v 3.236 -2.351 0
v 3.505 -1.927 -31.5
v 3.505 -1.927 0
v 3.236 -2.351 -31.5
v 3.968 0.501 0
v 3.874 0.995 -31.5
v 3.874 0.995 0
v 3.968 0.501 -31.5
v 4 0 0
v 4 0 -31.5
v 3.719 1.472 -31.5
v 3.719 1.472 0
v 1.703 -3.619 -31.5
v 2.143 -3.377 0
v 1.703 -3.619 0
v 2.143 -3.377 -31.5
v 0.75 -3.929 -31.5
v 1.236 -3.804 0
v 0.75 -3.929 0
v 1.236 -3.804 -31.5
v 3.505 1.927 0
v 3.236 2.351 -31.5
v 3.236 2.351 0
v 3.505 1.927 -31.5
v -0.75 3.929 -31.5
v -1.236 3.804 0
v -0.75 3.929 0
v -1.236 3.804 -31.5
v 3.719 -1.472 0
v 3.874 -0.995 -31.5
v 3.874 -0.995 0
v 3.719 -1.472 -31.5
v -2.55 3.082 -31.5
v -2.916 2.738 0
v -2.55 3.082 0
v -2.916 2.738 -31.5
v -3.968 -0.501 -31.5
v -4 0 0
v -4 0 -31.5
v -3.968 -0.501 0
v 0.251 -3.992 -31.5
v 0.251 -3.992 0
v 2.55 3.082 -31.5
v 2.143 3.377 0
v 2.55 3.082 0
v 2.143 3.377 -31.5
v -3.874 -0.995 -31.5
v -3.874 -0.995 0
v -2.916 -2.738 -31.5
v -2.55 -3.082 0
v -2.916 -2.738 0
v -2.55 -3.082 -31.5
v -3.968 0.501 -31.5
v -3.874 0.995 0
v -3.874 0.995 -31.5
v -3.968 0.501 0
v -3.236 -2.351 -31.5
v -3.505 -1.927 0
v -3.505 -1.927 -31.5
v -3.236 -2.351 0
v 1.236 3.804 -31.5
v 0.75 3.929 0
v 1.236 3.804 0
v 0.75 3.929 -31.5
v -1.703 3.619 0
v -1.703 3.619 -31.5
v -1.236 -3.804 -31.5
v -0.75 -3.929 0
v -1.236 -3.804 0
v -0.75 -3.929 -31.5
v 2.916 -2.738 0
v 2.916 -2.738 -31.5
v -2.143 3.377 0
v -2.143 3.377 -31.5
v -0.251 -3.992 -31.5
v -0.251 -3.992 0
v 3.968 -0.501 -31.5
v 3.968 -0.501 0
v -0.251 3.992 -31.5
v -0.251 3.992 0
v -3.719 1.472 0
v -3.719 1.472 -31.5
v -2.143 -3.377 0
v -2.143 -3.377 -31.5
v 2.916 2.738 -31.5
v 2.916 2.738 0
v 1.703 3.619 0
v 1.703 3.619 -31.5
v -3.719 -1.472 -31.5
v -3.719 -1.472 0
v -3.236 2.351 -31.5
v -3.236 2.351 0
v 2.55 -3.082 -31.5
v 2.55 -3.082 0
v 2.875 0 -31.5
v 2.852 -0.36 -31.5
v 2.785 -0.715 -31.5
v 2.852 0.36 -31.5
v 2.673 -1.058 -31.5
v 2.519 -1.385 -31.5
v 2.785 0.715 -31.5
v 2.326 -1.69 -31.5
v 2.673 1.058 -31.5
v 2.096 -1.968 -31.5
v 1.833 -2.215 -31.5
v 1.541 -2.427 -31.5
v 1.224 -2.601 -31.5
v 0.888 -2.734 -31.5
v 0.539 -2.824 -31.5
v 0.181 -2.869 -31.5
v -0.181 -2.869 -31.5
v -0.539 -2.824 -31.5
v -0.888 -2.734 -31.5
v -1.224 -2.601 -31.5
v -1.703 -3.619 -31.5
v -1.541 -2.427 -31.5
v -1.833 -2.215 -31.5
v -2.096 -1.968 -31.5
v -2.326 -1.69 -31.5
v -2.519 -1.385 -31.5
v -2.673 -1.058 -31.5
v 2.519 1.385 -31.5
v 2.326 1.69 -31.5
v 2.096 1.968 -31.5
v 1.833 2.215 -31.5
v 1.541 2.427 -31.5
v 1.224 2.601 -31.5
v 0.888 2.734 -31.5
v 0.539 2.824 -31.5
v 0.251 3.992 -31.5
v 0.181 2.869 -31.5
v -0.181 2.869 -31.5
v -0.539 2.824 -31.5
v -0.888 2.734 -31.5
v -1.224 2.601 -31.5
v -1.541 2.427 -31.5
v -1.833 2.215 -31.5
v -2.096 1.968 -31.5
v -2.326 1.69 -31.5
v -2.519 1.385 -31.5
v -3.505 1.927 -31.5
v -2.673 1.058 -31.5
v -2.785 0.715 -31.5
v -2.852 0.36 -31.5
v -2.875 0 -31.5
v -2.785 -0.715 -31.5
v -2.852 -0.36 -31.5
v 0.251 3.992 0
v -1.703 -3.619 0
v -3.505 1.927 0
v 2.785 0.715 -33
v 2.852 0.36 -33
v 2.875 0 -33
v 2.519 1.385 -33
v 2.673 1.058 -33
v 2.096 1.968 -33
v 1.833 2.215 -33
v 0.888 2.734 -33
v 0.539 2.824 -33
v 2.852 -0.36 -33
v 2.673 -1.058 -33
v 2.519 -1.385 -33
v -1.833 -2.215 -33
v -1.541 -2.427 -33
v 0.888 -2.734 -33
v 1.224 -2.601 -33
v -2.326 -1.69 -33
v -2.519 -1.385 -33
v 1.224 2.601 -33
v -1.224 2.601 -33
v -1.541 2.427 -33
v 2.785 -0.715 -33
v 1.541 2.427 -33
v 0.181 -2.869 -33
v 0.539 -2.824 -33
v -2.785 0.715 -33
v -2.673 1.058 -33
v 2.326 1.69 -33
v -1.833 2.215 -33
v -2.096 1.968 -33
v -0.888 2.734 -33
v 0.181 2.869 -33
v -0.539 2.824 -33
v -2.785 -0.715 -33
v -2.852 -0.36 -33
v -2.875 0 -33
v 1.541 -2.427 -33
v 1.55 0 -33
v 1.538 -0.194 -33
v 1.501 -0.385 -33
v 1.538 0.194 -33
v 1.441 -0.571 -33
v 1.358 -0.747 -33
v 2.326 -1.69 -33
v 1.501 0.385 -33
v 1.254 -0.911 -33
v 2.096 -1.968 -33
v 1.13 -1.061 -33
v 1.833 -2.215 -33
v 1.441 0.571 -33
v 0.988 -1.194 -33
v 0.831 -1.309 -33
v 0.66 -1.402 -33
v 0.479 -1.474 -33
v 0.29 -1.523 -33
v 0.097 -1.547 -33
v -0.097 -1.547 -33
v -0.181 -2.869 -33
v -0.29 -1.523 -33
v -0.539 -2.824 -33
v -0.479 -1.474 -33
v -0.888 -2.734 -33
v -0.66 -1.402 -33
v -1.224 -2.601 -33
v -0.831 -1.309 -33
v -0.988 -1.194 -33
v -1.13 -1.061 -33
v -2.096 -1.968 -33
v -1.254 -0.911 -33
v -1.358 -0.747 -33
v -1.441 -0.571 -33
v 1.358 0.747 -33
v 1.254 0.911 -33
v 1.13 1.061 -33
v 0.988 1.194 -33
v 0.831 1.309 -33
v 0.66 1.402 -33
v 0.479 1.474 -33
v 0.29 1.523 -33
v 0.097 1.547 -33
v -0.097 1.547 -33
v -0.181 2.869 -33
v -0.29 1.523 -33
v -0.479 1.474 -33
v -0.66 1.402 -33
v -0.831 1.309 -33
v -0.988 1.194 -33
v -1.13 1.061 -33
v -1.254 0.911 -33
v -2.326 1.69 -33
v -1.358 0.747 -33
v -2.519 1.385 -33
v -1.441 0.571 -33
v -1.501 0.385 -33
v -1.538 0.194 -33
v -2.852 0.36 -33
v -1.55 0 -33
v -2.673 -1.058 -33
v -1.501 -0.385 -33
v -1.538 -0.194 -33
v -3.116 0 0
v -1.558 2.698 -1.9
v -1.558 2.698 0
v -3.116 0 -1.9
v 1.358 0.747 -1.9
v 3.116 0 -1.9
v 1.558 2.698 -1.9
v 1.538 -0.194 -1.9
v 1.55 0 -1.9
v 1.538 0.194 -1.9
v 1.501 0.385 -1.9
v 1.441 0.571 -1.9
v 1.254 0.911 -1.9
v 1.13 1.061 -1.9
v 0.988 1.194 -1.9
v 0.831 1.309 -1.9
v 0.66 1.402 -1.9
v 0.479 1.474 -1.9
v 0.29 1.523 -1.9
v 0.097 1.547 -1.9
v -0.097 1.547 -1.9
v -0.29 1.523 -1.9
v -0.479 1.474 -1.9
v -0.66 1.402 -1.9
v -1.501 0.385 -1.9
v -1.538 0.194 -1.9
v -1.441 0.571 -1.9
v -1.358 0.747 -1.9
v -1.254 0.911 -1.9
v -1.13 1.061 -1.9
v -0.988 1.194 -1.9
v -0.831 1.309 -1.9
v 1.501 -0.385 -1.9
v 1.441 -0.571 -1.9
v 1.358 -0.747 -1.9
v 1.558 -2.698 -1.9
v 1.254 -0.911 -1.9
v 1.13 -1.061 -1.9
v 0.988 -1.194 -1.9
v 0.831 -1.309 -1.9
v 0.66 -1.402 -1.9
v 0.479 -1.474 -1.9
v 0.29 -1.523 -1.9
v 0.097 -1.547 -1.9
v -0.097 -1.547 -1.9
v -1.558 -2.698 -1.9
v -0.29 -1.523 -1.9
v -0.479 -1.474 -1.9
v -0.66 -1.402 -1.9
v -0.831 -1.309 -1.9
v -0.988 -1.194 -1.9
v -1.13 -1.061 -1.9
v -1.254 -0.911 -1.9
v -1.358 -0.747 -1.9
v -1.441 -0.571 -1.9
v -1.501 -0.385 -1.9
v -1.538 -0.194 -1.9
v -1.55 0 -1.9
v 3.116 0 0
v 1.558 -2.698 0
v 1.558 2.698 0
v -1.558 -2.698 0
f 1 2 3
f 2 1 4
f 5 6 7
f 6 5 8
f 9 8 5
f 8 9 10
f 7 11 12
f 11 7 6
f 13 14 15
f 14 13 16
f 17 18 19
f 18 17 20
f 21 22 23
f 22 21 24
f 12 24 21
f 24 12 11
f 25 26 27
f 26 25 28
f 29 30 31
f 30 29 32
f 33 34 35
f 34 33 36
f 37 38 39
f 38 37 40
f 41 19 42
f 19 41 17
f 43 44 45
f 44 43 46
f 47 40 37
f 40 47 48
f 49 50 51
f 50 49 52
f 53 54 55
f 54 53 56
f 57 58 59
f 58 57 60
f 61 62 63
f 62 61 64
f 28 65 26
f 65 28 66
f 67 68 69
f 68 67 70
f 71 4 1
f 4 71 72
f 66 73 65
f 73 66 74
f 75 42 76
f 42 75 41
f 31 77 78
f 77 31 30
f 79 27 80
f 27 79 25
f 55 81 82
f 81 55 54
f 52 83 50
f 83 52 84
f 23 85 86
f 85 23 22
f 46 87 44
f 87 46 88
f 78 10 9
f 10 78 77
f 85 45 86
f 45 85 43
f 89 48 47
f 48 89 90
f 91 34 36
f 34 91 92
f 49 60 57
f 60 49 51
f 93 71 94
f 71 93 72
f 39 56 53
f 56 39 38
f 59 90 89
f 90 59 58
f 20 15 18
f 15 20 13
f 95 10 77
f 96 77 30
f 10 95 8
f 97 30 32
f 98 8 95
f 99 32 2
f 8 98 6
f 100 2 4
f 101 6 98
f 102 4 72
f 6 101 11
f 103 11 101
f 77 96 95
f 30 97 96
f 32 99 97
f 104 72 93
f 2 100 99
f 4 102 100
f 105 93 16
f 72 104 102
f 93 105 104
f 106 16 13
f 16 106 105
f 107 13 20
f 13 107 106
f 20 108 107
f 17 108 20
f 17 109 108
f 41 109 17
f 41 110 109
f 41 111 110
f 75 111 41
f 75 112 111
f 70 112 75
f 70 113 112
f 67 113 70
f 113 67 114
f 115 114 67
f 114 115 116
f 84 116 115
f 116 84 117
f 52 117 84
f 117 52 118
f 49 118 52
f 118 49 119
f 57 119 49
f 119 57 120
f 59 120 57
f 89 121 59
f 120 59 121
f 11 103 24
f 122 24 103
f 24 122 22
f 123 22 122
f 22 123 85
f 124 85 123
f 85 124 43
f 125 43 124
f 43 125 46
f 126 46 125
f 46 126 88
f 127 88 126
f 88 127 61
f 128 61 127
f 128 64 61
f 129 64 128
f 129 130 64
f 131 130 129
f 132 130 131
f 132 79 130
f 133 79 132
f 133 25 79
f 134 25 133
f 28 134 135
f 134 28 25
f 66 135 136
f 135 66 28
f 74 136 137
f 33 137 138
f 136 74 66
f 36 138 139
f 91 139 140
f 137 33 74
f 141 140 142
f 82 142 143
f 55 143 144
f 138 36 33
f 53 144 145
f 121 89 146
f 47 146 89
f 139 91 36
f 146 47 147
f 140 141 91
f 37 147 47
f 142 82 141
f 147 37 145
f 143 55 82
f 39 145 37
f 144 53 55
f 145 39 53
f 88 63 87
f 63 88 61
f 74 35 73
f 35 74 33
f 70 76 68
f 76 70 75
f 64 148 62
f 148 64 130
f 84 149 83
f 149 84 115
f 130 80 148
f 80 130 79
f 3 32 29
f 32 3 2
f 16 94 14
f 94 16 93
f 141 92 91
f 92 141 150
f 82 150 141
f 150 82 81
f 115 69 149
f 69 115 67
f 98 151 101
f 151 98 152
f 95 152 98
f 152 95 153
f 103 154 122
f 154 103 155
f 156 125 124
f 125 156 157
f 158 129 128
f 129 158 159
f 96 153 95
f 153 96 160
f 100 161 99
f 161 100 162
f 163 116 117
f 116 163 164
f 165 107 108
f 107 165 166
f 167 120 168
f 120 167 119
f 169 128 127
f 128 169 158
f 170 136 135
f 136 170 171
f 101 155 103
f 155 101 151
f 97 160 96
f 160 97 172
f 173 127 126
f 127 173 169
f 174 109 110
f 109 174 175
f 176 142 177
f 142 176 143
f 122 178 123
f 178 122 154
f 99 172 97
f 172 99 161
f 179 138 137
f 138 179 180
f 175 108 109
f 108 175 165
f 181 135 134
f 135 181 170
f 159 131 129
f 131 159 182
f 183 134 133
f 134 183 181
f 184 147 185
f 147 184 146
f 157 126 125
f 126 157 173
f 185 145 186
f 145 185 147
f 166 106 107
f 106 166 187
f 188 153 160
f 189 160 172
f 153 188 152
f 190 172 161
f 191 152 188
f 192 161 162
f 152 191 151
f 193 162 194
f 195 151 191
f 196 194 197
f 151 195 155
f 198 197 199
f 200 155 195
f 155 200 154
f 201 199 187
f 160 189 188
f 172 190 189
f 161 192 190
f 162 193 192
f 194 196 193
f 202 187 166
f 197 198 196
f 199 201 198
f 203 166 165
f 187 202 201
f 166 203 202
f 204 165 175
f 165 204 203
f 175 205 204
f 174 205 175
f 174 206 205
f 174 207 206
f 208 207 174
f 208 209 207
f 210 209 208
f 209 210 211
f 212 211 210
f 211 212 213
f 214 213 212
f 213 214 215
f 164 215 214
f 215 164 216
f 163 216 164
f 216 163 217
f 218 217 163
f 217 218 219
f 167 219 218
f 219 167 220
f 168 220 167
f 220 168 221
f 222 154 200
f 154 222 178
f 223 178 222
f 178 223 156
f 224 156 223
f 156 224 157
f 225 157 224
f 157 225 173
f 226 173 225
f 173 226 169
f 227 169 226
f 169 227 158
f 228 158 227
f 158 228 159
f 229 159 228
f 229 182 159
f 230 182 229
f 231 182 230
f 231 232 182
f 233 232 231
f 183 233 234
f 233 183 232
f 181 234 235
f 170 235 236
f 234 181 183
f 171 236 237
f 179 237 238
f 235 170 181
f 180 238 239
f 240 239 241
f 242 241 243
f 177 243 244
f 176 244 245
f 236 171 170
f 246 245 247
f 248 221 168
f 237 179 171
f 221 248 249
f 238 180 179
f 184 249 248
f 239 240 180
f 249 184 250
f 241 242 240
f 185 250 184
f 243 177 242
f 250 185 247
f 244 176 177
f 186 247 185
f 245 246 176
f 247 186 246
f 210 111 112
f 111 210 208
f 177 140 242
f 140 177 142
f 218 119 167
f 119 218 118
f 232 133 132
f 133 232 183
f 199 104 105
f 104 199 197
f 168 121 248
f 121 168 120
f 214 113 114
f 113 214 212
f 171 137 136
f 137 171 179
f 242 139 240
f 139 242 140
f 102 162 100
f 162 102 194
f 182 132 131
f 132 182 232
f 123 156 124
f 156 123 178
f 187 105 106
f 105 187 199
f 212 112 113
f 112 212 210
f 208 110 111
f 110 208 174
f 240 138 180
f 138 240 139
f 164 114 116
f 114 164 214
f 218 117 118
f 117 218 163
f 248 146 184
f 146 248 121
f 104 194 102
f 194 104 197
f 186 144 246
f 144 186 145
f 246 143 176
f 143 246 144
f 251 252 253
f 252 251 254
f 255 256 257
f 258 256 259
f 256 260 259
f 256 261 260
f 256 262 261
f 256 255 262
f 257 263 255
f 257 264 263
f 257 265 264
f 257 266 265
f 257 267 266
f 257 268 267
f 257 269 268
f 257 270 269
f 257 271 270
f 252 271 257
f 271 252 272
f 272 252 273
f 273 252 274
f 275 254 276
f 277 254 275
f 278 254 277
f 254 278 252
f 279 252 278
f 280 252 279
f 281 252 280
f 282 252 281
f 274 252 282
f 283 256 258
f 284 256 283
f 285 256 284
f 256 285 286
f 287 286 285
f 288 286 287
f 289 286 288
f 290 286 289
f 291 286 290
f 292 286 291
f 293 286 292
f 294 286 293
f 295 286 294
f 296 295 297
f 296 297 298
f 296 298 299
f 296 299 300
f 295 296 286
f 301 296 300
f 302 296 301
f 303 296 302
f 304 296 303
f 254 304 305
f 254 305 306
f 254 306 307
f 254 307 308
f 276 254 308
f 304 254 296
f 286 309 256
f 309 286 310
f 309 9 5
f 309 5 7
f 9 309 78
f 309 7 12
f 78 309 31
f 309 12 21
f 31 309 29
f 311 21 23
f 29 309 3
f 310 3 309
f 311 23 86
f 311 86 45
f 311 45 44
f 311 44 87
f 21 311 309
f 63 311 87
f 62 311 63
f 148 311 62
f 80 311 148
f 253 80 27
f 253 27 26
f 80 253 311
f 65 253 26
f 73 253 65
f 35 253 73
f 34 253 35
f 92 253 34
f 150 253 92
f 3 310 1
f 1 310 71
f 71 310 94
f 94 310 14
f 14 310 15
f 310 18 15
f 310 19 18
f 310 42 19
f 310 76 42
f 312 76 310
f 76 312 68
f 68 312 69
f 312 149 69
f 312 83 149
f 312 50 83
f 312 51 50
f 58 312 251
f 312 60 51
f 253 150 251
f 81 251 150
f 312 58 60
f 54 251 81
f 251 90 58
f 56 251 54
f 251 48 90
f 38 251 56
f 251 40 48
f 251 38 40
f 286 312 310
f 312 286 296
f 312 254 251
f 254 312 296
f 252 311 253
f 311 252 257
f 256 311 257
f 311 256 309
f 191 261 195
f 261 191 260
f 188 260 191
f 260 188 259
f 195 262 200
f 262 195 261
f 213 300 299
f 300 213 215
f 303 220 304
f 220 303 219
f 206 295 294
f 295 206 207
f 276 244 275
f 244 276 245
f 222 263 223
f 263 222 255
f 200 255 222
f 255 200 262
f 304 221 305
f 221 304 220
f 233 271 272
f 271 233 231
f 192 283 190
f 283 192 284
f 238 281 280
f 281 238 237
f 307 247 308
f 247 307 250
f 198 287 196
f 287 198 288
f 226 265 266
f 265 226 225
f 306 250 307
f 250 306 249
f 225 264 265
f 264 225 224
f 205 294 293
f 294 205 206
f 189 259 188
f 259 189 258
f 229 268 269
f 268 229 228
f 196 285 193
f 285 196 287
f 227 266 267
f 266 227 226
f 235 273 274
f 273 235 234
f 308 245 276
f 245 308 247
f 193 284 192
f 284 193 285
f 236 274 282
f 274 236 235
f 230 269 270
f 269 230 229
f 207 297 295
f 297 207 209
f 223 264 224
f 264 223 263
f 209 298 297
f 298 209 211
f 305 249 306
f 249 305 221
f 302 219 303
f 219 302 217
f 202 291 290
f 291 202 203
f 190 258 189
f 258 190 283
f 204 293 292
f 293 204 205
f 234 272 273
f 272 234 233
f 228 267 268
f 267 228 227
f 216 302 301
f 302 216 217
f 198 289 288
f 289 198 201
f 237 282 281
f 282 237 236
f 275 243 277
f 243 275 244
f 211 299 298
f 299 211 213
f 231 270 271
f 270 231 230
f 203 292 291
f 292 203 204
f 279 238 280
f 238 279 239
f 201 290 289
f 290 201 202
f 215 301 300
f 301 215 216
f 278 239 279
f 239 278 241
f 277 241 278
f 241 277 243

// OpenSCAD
$fn = 50;

difference() {
	union() {
		translate(v = [0, 0, -31.5]) {
			cylinder(h = 34.5, r = 4.0);
		}
		#translate(v = [0, 0, -33.0]) {
			cylinder(h = 33, r = 2.875);
		}
	}
	union() {
		translate(v = [0, 0, 0]) {
			rotate(a = [0, 0, 0]) {
				difference() {
					union() {
						translate(v = [0, 0, -1.9]) {
							linear_extrude(height = 1.9) {
								polygon(points = [[3.1158, 0.0], [1.5579000000000005, 2.698361953111554], [-1.5578999999999994, 2.6983619531115544], [-3.1158, 3.815754496783323e-16], [-1.5579000000000014, -2.6983619531115535], [1.557899999999998, -2.6983619531115552]]);
							}
						}
					}
					union();
				}
			}
		}
		#cylinder(h = 3, r = 5.0);
		#translate(v = [0, 0, -100.0]) {
			cylinder(h = 200, r = 1.55);
		}
	}
}
